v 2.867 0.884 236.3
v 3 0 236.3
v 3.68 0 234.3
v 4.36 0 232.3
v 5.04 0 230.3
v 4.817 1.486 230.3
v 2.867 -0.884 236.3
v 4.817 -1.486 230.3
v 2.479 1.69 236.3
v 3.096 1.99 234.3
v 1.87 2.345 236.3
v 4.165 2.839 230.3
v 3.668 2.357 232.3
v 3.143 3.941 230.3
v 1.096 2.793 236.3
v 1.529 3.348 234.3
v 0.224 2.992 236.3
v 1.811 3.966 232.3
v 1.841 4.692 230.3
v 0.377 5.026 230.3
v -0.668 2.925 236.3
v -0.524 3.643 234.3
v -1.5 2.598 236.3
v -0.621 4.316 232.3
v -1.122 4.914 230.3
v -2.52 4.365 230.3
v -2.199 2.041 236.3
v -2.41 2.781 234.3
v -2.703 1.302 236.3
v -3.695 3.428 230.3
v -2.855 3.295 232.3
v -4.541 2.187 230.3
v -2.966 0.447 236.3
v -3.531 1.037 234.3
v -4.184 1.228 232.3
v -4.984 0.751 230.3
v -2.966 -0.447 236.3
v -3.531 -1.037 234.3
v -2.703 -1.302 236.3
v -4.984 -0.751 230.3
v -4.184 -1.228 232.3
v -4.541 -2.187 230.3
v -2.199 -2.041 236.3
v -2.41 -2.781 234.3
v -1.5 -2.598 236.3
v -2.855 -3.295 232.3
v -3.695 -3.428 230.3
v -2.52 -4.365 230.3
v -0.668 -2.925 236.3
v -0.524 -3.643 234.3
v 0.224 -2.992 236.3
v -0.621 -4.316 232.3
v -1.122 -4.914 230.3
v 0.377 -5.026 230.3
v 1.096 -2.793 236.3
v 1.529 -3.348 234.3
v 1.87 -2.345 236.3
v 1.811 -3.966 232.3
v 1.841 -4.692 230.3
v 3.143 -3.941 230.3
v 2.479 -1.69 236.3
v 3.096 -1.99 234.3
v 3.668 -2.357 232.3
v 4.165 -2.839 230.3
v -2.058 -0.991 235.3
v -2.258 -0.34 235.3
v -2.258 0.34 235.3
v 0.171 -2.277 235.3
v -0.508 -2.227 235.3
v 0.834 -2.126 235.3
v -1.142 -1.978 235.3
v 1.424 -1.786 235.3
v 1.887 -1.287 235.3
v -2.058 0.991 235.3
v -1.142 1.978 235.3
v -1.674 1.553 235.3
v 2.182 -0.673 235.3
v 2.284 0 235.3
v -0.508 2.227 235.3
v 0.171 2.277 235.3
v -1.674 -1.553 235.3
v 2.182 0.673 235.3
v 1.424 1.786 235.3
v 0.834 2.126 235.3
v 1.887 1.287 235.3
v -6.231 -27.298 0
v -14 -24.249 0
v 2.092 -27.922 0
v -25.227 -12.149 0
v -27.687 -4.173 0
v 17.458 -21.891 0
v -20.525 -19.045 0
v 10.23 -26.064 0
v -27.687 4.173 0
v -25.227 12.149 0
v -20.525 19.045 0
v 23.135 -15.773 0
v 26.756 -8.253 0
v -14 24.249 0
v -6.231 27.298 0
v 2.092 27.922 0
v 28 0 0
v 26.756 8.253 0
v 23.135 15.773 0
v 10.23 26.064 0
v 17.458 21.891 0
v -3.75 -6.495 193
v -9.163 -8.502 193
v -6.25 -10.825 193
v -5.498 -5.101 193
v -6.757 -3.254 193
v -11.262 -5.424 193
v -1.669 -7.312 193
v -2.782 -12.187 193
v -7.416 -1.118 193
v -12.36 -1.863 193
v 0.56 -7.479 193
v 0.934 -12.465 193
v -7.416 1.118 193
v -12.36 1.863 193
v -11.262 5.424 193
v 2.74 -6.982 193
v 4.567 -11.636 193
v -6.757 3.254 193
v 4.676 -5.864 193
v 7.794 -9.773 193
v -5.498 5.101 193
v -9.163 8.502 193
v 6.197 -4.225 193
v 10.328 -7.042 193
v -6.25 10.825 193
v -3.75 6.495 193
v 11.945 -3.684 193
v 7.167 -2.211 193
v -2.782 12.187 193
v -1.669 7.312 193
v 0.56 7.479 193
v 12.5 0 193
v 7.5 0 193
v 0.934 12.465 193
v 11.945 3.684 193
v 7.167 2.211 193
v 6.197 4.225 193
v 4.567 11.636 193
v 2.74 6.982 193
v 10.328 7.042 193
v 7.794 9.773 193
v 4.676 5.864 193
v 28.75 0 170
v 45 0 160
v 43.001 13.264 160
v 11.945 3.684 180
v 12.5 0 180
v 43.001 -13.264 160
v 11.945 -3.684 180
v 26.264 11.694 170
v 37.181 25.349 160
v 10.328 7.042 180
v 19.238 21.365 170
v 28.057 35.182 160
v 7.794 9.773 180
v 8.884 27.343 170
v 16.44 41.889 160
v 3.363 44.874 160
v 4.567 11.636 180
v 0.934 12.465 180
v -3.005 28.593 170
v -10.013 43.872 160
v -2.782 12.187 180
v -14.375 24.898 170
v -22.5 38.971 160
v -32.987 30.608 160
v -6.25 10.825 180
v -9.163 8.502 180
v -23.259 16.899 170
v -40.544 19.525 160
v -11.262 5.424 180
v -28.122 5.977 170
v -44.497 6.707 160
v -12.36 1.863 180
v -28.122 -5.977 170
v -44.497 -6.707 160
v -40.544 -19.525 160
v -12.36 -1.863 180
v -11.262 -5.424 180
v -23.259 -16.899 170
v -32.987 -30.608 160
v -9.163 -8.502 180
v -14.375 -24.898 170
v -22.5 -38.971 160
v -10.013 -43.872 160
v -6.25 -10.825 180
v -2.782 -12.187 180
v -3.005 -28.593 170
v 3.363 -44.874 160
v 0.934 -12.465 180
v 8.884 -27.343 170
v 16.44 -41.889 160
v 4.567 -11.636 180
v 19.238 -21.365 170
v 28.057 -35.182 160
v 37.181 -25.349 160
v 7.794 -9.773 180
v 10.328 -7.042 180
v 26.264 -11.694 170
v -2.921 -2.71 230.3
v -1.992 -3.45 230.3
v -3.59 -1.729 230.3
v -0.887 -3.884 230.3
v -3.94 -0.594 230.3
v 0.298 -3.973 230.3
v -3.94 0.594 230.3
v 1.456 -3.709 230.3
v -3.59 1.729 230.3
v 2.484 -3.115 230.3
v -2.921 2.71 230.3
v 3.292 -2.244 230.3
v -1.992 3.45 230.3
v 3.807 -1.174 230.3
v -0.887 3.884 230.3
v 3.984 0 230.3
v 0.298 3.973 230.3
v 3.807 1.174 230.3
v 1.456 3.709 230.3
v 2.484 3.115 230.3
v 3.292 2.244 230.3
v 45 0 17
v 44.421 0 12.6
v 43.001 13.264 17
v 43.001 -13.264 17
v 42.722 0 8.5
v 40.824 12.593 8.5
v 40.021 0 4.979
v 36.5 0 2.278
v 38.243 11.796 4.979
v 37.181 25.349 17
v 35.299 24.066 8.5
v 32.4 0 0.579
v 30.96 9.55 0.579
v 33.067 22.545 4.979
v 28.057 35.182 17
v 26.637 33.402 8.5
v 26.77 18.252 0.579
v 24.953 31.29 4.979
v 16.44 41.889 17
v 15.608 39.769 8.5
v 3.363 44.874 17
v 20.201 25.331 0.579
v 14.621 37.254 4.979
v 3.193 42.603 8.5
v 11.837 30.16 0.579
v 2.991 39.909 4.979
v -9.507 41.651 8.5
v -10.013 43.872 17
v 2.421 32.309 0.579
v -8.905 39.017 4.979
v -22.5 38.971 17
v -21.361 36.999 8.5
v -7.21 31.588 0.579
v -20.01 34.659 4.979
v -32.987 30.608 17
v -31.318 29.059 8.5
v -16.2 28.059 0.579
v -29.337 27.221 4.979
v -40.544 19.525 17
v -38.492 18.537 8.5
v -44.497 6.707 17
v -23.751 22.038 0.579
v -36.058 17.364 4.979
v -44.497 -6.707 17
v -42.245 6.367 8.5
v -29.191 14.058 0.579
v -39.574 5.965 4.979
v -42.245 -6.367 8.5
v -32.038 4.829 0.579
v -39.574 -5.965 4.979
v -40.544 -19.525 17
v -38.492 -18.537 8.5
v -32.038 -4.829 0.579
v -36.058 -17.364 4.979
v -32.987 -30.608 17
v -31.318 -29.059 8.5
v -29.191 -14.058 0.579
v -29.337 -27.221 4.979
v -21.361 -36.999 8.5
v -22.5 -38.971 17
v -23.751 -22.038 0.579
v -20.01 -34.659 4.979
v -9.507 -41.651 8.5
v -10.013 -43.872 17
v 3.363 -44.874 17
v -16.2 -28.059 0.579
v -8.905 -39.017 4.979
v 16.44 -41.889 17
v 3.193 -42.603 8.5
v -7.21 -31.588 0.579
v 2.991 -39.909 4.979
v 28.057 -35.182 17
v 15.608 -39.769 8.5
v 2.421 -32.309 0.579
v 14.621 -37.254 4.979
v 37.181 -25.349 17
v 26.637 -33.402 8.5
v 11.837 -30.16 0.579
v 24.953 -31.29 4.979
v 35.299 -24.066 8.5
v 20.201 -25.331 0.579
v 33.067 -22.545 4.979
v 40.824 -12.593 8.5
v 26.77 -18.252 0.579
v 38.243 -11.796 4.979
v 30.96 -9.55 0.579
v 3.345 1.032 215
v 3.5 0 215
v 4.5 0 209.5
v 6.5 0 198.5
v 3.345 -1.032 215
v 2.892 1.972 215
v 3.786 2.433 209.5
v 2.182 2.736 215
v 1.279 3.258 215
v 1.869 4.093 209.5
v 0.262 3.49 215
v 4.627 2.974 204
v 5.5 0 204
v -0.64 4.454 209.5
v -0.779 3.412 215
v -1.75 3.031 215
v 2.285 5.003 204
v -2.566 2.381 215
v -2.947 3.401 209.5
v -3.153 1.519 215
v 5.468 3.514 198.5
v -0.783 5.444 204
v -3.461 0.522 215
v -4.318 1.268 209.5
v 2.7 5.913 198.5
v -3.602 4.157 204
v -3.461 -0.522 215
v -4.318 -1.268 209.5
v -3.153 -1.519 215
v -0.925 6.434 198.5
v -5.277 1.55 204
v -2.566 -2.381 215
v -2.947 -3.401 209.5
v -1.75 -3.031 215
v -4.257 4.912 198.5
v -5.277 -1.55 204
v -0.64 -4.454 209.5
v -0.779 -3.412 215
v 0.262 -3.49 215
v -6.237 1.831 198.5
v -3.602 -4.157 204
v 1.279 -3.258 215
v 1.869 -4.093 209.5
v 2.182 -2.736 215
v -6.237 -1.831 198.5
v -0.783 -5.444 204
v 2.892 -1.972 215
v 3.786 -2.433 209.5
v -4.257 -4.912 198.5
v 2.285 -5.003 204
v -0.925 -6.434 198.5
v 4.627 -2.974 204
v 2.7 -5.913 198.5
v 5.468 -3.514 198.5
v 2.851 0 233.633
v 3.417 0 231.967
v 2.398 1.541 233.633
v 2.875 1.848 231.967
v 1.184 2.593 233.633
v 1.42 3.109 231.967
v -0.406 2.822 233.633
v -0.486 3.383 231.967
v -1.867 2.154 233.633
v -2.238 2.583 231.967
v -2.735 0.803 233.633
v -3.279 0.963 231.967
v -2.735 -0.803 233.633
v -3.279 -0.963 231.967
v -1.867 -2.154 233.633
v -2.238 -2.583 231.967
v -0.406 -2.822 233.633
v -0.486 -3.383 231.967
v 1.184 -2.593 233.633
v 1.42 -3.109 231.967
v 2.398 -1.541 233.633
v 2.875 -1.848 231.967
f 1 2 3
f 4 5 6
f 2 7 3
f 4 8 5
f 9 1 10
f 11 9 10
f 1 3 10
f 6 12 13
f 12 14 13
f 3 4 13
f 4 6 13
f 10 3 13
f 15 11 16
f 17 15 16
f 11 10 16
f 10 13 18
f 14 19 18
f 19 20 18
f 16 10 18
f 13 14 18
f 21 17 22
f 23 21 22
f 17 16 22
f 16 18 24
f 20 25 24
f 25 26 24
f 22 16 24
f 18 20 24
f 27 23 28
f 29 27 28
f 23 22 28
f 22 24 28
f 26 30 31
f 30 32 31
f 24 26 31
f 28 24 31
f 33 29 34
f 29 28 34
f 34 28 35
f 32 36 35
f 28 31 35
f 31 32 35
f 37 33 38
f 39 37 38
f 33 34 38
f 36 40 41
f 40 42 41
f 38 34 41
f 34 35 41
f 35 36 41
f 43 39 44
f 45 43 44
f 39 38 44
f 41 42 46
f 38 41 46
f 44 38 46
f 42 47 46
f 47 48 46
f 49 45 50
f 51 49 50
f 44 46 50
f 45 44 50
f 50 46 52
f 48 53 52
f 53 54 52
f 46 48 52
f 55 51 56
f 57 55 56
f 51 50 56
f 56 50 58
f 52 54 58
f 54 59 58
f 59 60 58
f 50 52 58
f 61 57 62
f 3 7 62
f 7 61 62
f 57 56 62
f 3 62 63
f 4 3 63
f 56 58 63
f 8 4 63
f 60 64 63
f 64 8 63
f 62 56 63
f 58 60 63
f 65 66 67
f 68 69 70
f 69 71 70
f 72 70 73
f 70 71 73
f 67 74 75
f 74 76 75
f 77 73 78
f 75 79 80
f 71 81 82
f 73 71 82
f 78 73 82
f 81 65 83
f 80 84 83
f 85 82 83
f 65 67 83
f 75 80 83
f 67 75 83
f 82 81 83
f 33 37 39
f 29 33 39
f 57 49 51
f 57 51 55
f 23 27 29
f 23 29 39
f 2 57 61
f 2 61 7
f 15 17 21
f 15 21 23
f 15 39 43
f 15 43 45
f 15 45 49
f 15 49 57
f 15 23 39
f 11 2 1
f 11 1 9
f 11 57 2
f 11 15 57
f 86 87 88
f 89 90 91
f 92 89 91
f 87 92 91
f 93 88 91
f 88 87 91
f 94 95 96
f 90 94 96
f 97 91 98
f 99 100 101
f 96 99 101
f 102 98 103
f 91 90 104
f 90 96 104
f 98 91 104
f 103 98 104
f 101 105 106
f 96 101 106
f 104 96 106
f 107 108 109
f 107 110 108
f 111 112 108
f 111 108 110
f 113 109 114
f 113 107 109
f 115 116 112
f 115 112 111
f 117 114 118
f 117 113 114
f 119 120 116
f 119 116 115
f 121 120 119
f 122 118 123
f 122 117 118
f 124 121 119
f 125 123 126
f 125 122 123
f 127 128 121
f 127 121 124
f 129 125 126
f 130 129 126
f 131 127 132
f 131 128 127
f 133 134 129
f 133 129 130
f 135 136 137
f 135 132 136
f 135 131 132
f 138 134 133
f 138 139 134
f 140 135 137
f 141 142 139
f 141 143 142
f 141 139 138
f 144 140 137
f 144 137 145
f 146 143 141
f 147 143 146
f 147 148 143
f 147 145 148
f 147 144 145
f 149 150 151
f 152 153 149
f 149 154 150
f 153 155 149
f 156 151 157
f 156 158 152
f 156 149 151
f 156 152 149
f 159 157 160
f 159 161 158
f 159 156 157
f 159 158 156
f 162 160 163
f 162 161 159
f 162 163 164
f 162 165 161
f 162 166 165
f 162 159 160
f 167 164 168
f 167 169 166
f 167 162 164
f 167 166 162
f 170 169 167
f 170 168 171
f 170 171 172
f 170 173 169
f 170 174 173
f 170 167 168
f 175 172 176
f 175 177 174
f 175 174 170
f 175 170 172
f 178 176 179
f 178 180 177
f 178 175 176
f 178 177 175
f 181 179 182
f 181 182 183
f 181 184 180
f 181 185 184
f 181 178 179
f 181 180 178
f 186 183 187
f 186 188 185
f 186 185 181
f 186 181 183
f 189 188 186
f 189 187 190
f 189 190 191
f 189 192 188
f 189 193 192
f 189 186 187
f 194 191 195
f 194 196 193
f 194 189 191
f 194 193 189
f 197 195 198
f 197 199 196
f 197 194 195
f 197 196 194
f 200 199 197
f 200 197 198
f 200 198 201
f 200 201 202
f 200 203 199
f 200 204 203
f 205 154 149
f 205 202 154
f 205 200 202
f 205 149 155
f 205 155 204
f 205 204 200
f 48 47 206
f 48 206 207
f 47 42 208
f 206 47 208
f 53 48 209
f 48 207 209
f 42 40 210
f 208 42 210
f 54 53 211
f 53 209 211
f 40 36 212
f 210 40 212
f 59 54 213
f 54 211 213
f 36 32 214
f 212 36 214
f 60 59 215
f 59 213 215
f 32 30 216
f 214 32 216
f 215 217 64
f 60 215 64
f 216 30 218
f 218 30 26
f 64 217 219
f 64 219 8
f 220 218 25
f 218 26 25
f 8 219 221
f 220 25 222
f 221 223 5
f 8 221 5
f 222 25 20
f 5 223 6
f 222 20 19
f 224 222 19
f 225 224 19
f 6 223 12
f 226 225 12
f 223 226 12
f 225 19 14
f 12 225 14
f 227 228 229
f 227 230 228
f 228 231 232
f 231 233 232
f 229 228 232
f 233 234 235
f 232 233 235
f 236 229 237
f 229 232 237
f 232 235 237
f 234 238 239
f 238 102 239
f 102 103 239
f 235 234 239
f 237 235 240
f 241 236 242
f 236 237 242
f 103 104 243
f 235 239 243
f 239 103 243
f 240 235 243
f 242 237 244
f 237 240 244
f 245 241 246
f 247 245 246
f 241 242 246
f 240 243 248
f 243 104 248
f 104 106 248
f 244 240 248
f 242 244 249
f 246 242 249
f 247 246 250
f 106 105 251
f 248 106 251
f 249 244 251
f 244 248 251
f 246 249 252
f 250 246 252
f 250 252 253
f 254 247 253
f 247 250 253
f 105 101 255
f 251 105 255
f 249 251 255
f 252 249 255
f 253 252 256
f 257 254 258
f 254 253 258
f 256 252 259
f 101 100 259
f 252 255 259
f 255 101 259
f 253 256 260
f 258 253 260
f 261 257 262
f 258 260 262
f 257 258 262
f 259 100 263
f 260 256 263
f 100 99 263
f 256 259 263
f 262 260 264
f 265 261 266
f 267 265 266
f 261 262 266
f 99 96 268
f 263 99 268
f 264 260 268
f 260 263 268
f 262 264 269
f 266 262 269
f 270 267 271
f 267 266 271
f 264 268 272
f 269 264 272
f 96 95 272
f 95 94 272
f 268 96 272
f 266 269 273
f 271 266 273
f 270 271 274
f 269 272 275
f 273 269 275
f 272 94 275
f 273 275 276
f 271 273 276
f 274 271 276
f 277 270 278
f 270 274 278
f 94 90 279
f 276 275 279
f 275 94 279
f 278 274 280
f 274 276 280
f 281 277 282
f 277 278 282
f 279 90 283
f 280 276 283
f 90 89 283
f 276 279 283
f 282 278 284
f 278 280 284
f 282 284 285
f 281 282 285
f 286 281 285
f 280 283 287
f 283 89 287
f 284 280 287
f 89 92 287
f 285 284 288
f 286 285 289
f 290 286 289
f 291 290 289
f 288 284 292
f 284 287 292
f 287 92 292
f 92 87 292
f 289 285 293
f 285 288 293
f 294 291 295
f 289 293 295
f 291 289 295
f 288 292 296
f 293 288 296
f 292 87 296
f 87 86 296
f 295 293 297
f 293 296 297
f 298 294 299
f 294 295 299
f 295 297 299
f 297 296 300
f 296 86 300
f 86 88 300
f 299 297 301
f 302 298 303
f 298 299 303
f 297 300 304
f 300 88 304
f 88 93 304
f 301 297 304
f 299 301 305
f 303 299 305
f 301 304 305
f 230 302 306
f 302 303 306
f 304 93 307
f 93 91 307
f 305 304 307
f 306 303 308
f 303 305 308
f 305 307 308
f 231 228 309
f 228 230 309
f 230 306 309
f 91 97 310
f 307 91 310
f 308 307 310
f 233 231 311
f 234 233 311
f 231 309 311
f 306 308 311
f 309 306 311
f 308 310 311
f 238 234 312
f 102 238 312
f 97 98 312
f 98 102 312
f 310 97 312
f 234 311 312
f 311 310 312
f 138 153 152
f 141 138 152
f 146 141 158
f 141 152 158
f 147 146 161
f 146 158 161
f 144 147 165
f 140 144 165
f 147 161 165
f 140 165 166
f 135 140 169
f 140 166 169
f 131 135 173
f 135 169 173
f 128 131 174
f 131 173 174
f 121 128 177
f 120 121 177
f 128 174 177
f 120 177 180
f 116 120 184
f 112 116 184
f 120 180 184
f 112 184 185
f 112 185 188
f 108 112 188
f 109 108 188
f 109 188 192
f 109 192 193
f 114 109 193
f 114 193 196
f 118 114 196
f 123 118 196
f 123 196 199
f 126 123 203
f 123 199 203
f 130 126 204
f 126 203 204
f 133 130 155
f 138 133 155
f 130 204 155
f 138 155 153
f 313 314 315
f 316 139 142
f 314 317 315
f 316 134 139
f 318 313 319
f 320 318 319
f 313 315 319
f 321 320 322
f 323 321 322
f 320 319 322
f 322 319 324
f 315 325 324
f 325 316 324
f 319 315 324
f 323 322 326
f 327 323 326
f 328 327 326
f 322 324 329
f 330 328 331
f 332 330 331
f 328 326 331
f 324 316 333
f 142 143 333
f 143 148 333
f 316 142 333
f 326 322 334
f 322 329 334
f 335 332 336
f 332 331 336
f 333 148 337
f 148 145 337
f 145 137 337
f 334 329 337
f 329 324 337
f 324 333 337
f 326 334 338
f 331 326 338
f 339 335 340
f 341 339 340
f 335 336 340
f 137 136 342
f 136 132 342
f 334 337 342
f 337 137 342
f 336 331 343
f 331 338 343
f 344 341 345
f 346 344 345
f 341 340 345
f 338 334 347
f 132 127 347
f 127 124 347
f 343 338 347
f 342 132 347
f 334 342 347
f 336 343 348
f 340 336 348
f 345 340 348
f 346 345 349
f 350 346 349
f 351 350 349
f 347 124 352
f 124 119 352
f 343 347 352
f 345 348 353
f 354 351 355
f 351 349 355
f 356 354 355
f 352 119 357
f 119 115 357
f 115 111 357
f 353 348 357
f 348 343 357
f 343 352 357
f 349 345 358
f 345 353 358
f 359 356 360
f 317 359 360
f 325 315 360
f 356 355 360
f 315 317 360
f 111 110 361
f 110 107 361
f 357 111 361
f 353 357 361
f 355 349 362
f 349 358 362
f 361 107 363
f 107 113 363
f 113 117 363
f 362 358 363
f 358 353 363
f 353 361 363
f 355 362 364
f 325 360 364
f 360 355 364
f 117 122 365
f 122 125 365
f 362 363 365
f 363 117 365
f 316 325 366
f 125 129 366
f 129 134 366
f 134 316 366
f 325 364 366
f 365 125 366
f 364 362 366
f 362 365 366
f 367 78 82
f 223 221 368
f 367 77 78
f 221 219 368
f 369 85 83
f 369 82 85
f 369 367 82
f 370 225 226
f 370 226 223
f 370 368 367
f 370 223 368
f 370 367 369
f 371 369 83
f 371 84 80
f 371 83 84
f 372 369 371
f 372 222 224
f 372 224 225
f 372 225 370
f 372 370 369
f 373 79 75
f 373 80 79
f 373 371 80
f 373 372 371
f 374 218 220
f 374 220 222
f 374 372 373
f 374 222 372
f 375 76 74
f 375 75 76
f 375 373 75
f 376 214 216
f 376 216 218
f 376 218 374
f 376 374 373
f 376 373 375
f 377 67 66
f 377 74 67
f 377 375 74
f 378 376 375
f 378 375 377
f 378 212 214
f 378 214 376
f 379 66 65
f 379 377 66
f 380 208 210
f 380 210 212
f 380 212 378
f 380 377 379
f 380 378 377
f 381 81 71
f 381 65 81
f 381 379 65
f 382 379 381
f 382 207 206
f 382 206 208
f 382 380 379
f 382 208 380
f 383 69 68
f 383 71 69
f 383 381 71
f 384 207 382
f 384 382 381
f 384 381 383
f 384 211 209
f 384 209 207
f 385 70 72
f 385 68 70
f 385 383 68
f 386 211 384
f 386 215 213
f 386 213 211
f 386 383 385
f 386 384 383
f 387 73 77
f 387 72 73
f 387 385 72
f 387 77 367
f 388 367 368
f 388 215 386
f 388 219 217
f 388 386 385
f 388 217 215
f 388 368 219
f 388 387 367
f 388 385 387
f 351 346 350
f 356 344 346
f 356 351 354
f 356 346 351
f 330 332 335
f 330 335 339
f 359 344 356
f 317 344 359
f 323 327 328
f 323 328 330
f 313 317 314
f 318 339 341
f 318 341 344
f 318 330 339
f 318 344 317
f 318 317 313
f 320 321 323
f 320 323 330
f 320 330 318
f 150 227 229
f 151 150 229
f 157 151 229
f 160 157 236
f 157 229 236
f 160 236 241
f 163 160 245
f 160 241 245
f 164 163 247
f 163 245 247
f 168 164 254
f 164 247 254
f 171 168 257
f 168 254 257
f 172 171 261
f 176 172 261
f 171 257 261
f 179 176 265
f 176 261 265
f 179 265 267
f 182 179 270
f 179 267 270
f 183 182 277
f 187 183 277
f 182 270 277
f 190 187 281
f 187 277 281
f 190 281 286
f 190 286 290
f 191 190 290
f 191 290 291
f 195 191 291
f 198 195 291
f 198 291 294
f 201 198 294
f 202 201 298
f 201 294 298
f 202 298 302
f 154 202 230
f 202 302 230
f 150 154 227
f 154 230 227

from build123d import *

# Parameters (mm, degrees)
F0_R      = 45
F1_DEPTH  = 160
F2_R      = 17
F1_FACE_R = 45
F4_R      = 12.5
F6_DEPTH  = 13
F9_R      = 3.5
F7_R      = 7.5
F14_R     = 3
F12_R     = 5.040451435
F16_T     = -1


with BuildPart() as f1:
    # F0 (on Top) → F1 (new body)
    with BuildSketch(Plane.XY):
        Circle(F0_R)
    extrude(amount=F1_DEPTH)

    # F2
    f2_edges = [f1.edges().sort_by_distance(p)[0] for p in [
        (-45, 0, 0),
    ]]
    fillet(f2_edges, radius=F2_R)

    # F1_face (on face) → F5 section 0
    with BuildSketch(Plane.XY.offset(160)):
        Circle(F1_FACE_R)
    # F4 (on offset) → F5 section 1
    with BuildSketch(Plane.XY.offset(180)):
        Circle(F4_R)
    loft()

    # F6 (add): a face of the model
    f6_faces = [f1.faces().sort_by_distance(p)[0] for p in [
        (0, 0, 180),
    ]]
    extrude(f6_faces, amount=F6_DEPTH)

    # F9 (on offset) → F10 section 0
    with BuildSketch(Plane.XY.offset(215)):
        Circle(F9_R)
    # F7 (on face) → F10 section 1
    with BuildSketch(Plane.XY.offset(193)):
        Circle(F7_R)
    loft()


with BuildPart() as f15:
    # F14 (on offset) → F15 section 0
    with BuildSketch(Plane.XY.offset(236.3)):
        Circle(F14_R)
    # F12 (on offset) → F15 section 1
    with BuildSketch(Plane.XY.offset(230.3)):
        Circle(F12_R)
    loft()

    # F16
    f16_openings = [f15.faces().sort_by_distance(p)[0] for p in [
        (0, 0, 230.3),
    ]]
    offset(amount=F16_T, openings=f16_openings, kind=Kind.INTERSECTION)


solid = Compound([f1.part, f15.part])
